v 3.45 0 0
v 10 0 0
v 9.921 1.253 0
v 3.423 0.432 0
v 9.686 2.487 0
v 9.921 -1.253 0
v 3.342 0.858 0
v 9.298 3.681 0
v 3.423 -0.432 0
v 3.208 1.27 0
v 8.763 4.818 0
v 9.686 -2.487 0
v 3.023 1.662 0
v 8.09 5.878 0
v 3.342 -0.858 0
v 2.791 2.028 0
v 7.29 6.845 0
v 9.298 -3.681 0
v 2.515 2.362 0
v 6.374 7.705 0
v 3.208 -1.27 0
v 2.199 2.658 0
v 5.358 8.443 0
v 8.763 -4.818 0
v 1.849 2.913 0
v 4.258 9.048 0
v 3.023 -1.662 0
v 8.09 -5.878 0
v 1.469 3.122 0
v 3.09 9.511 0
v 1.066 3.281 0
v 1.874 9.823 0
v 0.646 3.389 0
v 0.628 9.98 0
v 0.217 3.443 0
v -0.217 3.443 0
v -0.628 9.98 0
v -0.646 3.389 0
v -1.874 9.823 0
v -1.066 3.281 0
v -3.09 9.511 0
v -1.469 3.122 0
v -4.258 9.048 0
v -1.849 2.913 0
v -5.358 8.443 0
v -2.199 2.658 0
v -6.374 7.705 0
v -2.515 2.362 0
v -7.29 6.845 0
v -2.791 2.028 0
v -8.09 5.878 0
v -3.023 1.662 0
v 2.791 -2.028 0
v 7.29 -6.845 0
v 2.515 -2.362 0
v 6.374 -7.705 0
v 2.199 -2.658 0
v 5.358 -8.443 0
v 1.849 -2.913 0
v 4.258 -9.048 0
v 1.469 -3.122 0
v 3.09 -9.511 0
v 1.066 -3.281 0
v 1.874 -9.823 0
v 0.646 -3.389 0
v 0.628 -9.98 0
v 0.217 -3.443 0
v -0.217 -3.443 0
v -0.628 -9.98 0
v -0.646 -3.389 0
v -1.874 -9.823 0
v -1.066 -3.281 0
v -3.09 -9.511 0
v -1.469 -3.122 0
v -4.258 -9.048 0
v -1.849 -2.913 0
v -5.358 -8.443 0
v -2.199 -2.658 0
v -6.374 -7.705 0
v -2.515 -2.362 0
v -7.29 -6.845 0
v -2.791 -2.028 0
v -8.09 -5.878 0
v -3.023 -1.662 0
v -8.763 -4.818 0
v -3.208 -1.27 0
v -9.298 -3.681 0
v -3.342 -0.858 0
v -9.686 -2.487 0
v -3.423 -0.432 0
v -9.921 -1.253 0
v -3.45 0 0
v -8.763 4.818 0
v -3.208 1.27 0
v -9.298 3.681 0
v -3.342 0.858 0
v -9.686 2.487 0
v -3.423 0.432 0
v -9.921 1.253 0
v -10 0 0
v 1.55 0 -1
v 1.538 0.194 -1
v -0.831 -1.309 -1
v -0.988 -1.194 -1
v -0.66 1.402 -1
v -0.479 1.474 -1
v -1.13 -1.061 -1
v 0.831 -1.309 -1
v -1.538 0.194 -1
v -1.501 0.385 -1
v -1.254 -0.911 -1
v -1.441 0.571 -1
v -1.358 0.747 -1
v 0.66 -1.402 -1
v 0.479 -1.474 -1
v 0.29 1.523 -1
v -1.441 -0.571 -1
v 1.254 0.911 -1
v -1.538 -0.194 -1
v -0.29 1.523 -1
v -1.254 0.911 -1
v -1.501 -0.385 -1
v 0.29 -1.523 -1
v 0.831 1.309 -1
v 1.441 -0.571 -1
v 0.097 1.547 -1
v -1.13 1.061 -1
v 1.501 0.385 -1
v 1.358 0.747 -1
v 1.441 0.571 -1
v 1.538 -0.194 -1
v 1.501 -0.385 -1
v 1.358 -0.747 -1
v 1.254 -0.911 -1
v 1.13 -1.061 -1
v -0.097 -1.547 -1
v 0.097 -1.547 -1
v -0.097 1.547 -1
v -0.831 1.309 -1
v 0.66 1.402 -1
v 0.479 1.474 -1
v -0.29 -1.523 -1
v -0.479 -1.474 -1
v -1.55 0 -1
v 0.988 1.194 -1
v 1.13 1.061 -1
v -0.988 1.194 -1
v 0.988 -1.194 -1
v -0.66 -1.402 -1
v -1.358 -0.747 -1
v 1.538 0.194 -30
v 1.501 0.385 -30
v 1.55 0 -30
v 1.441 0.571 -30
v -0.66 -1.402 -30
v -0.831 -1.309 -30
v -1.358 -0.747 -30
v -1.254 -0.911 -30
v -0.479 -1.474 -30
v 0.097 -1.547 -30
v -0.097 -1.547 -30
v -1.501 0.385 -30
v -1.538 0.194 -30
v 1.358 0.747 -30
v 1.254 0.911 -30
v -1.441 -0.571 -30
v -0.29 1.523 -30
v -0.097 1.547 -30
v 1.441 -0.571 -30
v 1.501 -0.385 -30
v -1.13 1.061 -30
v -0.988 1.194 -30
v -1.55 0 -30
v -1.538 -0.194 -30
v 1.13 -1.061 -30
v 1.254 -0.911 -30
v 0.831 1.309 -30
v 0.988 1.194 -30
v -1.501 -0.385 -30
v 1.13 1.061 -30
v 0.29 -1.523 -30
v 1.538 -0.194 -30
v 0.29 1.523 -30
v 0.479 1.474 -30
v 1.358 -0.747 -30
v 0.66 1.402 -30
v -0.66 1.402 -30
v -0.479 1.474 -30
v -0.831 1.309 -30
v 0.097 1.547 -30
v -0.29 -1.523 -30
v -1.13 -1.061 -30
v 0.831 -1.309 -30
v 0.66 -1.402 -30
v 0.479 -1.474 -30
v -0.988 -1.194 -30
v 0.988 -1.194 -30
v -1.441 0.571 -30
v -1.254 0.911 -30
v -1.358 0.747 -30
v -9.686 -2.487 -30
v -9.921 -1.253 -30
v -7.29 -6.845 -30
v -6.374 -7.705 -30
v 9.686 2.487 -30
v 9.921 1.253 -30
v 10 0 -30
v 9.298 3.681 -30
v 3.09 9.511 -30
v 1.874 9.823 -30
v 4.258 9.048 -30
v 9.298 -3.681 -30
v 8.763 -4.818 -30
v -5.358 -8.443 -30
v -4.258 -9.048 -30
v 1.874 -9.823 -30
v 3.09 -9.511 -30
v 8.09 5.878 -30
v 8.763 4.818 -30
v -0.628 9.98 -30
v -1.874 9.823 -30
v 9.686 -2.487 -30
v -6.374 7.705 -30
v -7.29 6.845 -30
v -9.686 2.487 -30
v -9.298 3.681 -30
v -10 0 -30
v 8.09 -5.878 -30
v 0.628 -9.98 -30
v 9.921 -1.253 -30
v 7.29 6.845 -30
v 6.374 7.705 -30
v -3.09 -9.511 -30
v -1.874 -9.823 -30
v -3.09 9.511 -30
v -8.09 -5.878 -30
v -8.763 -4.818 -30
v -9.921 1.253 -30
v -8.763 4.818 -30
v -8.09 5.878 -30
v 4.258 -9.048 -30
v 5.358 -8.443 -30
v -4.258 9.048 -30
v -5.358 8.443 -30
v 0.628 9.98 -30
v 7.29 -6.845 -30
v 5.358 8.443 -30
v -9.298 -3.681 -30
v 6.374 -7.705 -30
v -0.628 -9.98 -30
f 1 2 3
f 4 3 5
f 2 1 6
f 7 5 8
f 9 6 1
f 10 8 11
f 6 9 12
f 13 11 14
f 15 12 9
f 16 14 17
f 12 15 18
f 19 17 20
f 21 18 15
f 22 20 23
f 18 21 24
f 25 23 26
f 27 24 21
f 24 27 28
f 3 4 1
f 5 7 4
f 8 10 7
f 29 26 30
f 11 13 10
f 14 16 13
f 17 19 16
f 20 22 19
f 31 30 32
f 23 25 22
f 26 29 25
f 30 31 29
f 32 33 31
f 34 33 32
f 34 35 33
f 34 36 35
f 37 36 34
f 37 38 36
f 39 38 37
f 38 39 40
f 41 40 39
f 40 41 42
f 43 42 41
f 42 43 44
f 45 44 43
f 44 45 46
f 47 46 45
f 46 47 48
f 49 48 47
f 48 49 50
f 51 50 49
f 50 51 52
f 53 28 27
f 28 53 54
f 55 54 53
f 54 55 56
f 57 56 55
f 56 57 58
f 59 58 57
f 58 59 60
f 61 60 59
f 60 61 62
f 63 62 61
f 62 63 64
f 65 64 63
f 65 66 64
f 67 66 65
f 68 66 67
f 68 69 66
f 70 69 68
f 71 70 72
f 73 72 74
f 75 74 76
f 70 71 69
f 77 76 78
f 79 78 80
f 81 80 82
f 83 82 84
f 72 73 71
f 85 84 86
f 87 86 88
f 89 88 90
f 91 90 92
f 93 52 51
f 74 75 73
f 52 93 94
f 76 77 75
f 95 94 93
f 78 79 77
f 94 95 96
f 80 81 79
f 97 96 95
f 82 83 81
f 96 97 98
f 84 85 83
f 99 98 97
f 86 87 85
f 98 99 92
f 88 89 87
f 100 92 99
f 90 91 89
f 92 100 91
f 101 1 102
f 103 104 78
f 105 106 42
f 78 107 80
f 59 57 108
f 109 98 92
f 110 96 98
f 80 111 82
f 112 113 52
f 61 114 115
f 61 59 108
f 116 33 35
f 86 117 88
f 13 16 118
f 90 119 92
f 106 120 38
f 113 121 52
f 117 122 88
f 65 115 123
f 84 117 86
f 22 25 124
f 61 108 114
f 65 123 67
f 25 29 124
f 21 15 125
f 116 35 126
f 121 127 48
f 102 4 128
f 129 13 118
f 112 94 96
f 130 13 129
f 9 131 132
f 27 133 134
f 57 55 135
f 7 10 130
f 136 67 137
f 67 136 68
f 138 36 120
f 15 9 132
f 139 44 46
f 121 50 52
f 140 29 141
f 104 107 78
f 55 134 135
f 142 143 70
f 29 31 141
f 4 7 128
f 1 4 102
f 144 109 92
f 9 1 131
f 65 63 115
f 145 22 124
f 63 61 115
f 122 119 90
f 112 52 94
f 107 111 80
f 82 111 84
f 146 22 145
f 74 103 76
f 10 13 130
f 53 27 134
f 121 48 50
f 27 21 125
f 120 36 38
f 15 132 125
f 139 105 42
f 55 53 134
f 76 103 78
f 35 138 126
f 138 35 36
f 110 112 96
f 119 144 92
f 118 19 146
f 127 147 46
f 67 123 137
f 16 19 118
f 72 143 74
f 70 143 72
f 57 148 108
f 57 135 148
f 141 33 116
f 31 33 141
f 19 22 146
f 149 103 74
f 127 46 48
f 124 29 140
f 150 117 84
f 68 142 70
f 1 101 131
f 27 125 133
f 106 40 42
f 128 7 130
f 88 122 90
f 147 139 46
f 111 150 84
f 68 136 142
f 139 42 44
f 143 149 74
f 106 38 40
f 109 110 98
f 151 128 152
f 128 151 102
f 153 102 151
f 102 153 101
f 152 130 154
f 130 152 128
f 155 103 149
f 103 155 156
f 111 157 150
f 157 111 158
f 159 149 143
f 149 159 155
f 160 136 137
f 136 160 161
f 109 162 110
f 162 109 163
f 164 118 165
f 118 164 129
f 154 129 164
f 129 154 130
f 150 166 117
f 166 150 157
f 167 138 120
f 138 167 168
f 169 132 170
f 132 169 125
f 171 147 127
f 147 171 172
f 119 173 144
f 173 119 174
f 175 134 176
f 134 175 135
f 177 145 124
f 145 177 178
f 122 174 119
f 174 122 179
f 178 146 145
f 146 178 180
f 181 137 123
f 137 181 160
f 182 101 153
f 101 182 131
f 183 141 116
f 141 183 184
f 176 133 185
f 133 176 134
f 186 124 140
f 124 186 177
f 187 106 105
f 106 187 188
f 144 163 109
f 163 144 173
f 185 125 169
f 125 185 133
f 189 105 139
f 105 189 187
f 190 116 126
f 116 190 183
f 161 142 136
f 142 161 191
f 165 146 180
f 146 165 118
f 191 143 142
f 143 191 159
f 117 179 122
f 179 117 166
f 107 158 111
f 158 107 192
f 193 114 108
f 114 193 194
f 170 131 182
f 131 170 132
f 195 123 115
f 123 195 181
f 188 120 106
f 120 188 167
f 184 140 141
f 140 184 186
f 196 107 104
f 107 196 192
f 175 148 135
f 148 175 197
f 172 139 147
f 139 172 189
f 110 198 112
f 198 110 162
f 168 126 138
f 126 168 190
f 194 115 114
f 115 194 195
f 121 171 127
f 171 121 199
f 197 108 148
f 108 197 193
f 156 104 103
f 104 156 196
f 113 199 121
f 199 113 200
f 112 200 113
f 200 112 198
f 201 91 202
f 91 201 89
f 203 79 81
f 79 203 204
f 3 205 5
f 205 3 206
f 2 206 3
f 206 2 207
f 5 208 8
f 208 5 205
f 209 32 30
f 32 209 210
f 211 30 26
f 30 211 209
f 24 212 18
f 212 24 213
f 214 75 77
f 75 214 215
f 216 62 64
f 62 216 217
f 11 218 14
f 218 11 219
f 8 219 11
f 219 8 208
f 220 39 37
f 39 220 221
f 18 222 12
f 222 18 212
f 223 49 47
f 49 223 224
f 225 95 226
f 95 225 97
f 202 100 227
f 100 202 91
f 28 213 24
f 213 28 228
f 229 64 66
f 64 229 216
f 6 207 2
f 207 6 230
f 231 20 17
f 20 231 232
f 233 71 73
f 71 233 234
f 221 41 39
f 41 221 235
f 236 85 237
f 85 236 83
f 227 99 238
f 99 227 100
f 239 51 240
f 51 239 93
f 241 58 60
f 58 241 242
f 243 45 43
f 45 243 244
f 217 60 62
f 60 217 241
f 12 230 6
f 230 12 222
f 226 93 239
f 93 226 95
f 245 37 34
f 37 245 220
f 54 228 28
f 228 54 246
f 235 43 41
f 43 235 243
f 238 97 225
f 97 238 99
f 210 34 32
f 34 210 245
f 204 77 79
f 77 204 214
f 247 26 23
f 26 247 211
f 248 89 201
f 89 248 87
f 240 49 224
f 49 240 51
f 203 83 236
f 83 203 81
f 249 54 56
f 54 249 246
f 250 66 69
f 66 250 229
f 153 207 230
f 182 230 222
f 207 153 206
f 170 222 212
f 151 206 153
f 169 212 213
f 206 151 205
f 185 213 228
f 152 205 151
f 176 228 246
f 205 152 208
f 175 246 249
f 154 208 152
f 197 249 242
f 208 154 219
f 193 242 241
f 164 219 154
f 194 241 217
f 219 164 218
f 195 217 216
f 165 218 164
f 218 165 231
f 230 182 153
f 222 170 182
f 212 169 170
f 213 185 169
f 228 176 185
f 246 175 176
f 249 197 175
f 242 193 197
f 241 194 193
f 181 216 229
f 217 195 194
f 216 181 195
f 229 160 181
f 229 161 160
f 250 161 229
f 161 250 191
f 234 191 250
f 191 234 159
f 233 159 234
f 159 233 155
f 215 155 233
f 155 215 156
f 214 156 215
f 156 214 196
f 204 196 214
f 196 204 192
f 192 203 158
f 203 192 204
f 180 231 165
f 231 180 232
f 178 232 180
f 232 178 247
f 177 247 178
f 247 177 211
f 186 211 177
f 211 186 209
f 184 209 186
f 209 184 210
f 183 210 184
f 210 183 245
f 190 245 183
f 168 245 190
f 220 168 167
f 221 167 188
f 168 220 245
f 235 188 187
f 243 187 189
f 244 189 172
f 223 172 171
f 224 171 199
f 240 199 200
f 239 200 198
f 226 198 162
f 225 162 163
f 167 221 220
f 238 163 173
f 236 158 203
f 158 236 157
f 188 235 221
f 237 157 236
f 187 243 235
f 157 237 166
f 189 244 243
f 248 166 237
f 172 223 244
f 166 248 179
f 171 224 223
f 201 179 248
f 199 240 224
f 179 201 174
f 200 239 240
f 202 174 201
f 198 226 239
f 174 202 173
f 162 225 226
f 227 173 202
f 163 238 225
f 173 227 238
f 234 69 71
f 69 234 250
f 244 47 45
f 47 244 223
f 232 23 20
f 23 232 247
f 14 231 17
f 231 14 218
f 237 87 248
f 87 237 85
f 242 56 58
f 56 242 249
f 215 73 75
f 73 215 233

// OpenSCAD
$fn = 50;

difference() {
	union() {
		translate(v = [0, 0, -30.0]) {
			cylinder(h = 30, r = 10.0);
		}
	}
	union() {
		translate(v = [0, 0, 0]) {
			rotate(a = [0, 0, 0]) {
				difference() {
					union() {
						translate(v = [0, 0, -33.0]) {
							cylinder(h = 33, r = 1.25);
						}
						translate(v = [0, 0, -1.0]) {
							cylinder(h = 1.0, r1 = 1.55, r2 = 3.45);
						}
						translate(v = [0, 0, -33.0]) {
							cylinder(h = 33, r = 1.55);
						}
						translate(v = [0, 0, -33.0]) {
							cylinder(h = 33, r = 1.25);
						}
					}
					union();
				}
			}
		}
	}
}
